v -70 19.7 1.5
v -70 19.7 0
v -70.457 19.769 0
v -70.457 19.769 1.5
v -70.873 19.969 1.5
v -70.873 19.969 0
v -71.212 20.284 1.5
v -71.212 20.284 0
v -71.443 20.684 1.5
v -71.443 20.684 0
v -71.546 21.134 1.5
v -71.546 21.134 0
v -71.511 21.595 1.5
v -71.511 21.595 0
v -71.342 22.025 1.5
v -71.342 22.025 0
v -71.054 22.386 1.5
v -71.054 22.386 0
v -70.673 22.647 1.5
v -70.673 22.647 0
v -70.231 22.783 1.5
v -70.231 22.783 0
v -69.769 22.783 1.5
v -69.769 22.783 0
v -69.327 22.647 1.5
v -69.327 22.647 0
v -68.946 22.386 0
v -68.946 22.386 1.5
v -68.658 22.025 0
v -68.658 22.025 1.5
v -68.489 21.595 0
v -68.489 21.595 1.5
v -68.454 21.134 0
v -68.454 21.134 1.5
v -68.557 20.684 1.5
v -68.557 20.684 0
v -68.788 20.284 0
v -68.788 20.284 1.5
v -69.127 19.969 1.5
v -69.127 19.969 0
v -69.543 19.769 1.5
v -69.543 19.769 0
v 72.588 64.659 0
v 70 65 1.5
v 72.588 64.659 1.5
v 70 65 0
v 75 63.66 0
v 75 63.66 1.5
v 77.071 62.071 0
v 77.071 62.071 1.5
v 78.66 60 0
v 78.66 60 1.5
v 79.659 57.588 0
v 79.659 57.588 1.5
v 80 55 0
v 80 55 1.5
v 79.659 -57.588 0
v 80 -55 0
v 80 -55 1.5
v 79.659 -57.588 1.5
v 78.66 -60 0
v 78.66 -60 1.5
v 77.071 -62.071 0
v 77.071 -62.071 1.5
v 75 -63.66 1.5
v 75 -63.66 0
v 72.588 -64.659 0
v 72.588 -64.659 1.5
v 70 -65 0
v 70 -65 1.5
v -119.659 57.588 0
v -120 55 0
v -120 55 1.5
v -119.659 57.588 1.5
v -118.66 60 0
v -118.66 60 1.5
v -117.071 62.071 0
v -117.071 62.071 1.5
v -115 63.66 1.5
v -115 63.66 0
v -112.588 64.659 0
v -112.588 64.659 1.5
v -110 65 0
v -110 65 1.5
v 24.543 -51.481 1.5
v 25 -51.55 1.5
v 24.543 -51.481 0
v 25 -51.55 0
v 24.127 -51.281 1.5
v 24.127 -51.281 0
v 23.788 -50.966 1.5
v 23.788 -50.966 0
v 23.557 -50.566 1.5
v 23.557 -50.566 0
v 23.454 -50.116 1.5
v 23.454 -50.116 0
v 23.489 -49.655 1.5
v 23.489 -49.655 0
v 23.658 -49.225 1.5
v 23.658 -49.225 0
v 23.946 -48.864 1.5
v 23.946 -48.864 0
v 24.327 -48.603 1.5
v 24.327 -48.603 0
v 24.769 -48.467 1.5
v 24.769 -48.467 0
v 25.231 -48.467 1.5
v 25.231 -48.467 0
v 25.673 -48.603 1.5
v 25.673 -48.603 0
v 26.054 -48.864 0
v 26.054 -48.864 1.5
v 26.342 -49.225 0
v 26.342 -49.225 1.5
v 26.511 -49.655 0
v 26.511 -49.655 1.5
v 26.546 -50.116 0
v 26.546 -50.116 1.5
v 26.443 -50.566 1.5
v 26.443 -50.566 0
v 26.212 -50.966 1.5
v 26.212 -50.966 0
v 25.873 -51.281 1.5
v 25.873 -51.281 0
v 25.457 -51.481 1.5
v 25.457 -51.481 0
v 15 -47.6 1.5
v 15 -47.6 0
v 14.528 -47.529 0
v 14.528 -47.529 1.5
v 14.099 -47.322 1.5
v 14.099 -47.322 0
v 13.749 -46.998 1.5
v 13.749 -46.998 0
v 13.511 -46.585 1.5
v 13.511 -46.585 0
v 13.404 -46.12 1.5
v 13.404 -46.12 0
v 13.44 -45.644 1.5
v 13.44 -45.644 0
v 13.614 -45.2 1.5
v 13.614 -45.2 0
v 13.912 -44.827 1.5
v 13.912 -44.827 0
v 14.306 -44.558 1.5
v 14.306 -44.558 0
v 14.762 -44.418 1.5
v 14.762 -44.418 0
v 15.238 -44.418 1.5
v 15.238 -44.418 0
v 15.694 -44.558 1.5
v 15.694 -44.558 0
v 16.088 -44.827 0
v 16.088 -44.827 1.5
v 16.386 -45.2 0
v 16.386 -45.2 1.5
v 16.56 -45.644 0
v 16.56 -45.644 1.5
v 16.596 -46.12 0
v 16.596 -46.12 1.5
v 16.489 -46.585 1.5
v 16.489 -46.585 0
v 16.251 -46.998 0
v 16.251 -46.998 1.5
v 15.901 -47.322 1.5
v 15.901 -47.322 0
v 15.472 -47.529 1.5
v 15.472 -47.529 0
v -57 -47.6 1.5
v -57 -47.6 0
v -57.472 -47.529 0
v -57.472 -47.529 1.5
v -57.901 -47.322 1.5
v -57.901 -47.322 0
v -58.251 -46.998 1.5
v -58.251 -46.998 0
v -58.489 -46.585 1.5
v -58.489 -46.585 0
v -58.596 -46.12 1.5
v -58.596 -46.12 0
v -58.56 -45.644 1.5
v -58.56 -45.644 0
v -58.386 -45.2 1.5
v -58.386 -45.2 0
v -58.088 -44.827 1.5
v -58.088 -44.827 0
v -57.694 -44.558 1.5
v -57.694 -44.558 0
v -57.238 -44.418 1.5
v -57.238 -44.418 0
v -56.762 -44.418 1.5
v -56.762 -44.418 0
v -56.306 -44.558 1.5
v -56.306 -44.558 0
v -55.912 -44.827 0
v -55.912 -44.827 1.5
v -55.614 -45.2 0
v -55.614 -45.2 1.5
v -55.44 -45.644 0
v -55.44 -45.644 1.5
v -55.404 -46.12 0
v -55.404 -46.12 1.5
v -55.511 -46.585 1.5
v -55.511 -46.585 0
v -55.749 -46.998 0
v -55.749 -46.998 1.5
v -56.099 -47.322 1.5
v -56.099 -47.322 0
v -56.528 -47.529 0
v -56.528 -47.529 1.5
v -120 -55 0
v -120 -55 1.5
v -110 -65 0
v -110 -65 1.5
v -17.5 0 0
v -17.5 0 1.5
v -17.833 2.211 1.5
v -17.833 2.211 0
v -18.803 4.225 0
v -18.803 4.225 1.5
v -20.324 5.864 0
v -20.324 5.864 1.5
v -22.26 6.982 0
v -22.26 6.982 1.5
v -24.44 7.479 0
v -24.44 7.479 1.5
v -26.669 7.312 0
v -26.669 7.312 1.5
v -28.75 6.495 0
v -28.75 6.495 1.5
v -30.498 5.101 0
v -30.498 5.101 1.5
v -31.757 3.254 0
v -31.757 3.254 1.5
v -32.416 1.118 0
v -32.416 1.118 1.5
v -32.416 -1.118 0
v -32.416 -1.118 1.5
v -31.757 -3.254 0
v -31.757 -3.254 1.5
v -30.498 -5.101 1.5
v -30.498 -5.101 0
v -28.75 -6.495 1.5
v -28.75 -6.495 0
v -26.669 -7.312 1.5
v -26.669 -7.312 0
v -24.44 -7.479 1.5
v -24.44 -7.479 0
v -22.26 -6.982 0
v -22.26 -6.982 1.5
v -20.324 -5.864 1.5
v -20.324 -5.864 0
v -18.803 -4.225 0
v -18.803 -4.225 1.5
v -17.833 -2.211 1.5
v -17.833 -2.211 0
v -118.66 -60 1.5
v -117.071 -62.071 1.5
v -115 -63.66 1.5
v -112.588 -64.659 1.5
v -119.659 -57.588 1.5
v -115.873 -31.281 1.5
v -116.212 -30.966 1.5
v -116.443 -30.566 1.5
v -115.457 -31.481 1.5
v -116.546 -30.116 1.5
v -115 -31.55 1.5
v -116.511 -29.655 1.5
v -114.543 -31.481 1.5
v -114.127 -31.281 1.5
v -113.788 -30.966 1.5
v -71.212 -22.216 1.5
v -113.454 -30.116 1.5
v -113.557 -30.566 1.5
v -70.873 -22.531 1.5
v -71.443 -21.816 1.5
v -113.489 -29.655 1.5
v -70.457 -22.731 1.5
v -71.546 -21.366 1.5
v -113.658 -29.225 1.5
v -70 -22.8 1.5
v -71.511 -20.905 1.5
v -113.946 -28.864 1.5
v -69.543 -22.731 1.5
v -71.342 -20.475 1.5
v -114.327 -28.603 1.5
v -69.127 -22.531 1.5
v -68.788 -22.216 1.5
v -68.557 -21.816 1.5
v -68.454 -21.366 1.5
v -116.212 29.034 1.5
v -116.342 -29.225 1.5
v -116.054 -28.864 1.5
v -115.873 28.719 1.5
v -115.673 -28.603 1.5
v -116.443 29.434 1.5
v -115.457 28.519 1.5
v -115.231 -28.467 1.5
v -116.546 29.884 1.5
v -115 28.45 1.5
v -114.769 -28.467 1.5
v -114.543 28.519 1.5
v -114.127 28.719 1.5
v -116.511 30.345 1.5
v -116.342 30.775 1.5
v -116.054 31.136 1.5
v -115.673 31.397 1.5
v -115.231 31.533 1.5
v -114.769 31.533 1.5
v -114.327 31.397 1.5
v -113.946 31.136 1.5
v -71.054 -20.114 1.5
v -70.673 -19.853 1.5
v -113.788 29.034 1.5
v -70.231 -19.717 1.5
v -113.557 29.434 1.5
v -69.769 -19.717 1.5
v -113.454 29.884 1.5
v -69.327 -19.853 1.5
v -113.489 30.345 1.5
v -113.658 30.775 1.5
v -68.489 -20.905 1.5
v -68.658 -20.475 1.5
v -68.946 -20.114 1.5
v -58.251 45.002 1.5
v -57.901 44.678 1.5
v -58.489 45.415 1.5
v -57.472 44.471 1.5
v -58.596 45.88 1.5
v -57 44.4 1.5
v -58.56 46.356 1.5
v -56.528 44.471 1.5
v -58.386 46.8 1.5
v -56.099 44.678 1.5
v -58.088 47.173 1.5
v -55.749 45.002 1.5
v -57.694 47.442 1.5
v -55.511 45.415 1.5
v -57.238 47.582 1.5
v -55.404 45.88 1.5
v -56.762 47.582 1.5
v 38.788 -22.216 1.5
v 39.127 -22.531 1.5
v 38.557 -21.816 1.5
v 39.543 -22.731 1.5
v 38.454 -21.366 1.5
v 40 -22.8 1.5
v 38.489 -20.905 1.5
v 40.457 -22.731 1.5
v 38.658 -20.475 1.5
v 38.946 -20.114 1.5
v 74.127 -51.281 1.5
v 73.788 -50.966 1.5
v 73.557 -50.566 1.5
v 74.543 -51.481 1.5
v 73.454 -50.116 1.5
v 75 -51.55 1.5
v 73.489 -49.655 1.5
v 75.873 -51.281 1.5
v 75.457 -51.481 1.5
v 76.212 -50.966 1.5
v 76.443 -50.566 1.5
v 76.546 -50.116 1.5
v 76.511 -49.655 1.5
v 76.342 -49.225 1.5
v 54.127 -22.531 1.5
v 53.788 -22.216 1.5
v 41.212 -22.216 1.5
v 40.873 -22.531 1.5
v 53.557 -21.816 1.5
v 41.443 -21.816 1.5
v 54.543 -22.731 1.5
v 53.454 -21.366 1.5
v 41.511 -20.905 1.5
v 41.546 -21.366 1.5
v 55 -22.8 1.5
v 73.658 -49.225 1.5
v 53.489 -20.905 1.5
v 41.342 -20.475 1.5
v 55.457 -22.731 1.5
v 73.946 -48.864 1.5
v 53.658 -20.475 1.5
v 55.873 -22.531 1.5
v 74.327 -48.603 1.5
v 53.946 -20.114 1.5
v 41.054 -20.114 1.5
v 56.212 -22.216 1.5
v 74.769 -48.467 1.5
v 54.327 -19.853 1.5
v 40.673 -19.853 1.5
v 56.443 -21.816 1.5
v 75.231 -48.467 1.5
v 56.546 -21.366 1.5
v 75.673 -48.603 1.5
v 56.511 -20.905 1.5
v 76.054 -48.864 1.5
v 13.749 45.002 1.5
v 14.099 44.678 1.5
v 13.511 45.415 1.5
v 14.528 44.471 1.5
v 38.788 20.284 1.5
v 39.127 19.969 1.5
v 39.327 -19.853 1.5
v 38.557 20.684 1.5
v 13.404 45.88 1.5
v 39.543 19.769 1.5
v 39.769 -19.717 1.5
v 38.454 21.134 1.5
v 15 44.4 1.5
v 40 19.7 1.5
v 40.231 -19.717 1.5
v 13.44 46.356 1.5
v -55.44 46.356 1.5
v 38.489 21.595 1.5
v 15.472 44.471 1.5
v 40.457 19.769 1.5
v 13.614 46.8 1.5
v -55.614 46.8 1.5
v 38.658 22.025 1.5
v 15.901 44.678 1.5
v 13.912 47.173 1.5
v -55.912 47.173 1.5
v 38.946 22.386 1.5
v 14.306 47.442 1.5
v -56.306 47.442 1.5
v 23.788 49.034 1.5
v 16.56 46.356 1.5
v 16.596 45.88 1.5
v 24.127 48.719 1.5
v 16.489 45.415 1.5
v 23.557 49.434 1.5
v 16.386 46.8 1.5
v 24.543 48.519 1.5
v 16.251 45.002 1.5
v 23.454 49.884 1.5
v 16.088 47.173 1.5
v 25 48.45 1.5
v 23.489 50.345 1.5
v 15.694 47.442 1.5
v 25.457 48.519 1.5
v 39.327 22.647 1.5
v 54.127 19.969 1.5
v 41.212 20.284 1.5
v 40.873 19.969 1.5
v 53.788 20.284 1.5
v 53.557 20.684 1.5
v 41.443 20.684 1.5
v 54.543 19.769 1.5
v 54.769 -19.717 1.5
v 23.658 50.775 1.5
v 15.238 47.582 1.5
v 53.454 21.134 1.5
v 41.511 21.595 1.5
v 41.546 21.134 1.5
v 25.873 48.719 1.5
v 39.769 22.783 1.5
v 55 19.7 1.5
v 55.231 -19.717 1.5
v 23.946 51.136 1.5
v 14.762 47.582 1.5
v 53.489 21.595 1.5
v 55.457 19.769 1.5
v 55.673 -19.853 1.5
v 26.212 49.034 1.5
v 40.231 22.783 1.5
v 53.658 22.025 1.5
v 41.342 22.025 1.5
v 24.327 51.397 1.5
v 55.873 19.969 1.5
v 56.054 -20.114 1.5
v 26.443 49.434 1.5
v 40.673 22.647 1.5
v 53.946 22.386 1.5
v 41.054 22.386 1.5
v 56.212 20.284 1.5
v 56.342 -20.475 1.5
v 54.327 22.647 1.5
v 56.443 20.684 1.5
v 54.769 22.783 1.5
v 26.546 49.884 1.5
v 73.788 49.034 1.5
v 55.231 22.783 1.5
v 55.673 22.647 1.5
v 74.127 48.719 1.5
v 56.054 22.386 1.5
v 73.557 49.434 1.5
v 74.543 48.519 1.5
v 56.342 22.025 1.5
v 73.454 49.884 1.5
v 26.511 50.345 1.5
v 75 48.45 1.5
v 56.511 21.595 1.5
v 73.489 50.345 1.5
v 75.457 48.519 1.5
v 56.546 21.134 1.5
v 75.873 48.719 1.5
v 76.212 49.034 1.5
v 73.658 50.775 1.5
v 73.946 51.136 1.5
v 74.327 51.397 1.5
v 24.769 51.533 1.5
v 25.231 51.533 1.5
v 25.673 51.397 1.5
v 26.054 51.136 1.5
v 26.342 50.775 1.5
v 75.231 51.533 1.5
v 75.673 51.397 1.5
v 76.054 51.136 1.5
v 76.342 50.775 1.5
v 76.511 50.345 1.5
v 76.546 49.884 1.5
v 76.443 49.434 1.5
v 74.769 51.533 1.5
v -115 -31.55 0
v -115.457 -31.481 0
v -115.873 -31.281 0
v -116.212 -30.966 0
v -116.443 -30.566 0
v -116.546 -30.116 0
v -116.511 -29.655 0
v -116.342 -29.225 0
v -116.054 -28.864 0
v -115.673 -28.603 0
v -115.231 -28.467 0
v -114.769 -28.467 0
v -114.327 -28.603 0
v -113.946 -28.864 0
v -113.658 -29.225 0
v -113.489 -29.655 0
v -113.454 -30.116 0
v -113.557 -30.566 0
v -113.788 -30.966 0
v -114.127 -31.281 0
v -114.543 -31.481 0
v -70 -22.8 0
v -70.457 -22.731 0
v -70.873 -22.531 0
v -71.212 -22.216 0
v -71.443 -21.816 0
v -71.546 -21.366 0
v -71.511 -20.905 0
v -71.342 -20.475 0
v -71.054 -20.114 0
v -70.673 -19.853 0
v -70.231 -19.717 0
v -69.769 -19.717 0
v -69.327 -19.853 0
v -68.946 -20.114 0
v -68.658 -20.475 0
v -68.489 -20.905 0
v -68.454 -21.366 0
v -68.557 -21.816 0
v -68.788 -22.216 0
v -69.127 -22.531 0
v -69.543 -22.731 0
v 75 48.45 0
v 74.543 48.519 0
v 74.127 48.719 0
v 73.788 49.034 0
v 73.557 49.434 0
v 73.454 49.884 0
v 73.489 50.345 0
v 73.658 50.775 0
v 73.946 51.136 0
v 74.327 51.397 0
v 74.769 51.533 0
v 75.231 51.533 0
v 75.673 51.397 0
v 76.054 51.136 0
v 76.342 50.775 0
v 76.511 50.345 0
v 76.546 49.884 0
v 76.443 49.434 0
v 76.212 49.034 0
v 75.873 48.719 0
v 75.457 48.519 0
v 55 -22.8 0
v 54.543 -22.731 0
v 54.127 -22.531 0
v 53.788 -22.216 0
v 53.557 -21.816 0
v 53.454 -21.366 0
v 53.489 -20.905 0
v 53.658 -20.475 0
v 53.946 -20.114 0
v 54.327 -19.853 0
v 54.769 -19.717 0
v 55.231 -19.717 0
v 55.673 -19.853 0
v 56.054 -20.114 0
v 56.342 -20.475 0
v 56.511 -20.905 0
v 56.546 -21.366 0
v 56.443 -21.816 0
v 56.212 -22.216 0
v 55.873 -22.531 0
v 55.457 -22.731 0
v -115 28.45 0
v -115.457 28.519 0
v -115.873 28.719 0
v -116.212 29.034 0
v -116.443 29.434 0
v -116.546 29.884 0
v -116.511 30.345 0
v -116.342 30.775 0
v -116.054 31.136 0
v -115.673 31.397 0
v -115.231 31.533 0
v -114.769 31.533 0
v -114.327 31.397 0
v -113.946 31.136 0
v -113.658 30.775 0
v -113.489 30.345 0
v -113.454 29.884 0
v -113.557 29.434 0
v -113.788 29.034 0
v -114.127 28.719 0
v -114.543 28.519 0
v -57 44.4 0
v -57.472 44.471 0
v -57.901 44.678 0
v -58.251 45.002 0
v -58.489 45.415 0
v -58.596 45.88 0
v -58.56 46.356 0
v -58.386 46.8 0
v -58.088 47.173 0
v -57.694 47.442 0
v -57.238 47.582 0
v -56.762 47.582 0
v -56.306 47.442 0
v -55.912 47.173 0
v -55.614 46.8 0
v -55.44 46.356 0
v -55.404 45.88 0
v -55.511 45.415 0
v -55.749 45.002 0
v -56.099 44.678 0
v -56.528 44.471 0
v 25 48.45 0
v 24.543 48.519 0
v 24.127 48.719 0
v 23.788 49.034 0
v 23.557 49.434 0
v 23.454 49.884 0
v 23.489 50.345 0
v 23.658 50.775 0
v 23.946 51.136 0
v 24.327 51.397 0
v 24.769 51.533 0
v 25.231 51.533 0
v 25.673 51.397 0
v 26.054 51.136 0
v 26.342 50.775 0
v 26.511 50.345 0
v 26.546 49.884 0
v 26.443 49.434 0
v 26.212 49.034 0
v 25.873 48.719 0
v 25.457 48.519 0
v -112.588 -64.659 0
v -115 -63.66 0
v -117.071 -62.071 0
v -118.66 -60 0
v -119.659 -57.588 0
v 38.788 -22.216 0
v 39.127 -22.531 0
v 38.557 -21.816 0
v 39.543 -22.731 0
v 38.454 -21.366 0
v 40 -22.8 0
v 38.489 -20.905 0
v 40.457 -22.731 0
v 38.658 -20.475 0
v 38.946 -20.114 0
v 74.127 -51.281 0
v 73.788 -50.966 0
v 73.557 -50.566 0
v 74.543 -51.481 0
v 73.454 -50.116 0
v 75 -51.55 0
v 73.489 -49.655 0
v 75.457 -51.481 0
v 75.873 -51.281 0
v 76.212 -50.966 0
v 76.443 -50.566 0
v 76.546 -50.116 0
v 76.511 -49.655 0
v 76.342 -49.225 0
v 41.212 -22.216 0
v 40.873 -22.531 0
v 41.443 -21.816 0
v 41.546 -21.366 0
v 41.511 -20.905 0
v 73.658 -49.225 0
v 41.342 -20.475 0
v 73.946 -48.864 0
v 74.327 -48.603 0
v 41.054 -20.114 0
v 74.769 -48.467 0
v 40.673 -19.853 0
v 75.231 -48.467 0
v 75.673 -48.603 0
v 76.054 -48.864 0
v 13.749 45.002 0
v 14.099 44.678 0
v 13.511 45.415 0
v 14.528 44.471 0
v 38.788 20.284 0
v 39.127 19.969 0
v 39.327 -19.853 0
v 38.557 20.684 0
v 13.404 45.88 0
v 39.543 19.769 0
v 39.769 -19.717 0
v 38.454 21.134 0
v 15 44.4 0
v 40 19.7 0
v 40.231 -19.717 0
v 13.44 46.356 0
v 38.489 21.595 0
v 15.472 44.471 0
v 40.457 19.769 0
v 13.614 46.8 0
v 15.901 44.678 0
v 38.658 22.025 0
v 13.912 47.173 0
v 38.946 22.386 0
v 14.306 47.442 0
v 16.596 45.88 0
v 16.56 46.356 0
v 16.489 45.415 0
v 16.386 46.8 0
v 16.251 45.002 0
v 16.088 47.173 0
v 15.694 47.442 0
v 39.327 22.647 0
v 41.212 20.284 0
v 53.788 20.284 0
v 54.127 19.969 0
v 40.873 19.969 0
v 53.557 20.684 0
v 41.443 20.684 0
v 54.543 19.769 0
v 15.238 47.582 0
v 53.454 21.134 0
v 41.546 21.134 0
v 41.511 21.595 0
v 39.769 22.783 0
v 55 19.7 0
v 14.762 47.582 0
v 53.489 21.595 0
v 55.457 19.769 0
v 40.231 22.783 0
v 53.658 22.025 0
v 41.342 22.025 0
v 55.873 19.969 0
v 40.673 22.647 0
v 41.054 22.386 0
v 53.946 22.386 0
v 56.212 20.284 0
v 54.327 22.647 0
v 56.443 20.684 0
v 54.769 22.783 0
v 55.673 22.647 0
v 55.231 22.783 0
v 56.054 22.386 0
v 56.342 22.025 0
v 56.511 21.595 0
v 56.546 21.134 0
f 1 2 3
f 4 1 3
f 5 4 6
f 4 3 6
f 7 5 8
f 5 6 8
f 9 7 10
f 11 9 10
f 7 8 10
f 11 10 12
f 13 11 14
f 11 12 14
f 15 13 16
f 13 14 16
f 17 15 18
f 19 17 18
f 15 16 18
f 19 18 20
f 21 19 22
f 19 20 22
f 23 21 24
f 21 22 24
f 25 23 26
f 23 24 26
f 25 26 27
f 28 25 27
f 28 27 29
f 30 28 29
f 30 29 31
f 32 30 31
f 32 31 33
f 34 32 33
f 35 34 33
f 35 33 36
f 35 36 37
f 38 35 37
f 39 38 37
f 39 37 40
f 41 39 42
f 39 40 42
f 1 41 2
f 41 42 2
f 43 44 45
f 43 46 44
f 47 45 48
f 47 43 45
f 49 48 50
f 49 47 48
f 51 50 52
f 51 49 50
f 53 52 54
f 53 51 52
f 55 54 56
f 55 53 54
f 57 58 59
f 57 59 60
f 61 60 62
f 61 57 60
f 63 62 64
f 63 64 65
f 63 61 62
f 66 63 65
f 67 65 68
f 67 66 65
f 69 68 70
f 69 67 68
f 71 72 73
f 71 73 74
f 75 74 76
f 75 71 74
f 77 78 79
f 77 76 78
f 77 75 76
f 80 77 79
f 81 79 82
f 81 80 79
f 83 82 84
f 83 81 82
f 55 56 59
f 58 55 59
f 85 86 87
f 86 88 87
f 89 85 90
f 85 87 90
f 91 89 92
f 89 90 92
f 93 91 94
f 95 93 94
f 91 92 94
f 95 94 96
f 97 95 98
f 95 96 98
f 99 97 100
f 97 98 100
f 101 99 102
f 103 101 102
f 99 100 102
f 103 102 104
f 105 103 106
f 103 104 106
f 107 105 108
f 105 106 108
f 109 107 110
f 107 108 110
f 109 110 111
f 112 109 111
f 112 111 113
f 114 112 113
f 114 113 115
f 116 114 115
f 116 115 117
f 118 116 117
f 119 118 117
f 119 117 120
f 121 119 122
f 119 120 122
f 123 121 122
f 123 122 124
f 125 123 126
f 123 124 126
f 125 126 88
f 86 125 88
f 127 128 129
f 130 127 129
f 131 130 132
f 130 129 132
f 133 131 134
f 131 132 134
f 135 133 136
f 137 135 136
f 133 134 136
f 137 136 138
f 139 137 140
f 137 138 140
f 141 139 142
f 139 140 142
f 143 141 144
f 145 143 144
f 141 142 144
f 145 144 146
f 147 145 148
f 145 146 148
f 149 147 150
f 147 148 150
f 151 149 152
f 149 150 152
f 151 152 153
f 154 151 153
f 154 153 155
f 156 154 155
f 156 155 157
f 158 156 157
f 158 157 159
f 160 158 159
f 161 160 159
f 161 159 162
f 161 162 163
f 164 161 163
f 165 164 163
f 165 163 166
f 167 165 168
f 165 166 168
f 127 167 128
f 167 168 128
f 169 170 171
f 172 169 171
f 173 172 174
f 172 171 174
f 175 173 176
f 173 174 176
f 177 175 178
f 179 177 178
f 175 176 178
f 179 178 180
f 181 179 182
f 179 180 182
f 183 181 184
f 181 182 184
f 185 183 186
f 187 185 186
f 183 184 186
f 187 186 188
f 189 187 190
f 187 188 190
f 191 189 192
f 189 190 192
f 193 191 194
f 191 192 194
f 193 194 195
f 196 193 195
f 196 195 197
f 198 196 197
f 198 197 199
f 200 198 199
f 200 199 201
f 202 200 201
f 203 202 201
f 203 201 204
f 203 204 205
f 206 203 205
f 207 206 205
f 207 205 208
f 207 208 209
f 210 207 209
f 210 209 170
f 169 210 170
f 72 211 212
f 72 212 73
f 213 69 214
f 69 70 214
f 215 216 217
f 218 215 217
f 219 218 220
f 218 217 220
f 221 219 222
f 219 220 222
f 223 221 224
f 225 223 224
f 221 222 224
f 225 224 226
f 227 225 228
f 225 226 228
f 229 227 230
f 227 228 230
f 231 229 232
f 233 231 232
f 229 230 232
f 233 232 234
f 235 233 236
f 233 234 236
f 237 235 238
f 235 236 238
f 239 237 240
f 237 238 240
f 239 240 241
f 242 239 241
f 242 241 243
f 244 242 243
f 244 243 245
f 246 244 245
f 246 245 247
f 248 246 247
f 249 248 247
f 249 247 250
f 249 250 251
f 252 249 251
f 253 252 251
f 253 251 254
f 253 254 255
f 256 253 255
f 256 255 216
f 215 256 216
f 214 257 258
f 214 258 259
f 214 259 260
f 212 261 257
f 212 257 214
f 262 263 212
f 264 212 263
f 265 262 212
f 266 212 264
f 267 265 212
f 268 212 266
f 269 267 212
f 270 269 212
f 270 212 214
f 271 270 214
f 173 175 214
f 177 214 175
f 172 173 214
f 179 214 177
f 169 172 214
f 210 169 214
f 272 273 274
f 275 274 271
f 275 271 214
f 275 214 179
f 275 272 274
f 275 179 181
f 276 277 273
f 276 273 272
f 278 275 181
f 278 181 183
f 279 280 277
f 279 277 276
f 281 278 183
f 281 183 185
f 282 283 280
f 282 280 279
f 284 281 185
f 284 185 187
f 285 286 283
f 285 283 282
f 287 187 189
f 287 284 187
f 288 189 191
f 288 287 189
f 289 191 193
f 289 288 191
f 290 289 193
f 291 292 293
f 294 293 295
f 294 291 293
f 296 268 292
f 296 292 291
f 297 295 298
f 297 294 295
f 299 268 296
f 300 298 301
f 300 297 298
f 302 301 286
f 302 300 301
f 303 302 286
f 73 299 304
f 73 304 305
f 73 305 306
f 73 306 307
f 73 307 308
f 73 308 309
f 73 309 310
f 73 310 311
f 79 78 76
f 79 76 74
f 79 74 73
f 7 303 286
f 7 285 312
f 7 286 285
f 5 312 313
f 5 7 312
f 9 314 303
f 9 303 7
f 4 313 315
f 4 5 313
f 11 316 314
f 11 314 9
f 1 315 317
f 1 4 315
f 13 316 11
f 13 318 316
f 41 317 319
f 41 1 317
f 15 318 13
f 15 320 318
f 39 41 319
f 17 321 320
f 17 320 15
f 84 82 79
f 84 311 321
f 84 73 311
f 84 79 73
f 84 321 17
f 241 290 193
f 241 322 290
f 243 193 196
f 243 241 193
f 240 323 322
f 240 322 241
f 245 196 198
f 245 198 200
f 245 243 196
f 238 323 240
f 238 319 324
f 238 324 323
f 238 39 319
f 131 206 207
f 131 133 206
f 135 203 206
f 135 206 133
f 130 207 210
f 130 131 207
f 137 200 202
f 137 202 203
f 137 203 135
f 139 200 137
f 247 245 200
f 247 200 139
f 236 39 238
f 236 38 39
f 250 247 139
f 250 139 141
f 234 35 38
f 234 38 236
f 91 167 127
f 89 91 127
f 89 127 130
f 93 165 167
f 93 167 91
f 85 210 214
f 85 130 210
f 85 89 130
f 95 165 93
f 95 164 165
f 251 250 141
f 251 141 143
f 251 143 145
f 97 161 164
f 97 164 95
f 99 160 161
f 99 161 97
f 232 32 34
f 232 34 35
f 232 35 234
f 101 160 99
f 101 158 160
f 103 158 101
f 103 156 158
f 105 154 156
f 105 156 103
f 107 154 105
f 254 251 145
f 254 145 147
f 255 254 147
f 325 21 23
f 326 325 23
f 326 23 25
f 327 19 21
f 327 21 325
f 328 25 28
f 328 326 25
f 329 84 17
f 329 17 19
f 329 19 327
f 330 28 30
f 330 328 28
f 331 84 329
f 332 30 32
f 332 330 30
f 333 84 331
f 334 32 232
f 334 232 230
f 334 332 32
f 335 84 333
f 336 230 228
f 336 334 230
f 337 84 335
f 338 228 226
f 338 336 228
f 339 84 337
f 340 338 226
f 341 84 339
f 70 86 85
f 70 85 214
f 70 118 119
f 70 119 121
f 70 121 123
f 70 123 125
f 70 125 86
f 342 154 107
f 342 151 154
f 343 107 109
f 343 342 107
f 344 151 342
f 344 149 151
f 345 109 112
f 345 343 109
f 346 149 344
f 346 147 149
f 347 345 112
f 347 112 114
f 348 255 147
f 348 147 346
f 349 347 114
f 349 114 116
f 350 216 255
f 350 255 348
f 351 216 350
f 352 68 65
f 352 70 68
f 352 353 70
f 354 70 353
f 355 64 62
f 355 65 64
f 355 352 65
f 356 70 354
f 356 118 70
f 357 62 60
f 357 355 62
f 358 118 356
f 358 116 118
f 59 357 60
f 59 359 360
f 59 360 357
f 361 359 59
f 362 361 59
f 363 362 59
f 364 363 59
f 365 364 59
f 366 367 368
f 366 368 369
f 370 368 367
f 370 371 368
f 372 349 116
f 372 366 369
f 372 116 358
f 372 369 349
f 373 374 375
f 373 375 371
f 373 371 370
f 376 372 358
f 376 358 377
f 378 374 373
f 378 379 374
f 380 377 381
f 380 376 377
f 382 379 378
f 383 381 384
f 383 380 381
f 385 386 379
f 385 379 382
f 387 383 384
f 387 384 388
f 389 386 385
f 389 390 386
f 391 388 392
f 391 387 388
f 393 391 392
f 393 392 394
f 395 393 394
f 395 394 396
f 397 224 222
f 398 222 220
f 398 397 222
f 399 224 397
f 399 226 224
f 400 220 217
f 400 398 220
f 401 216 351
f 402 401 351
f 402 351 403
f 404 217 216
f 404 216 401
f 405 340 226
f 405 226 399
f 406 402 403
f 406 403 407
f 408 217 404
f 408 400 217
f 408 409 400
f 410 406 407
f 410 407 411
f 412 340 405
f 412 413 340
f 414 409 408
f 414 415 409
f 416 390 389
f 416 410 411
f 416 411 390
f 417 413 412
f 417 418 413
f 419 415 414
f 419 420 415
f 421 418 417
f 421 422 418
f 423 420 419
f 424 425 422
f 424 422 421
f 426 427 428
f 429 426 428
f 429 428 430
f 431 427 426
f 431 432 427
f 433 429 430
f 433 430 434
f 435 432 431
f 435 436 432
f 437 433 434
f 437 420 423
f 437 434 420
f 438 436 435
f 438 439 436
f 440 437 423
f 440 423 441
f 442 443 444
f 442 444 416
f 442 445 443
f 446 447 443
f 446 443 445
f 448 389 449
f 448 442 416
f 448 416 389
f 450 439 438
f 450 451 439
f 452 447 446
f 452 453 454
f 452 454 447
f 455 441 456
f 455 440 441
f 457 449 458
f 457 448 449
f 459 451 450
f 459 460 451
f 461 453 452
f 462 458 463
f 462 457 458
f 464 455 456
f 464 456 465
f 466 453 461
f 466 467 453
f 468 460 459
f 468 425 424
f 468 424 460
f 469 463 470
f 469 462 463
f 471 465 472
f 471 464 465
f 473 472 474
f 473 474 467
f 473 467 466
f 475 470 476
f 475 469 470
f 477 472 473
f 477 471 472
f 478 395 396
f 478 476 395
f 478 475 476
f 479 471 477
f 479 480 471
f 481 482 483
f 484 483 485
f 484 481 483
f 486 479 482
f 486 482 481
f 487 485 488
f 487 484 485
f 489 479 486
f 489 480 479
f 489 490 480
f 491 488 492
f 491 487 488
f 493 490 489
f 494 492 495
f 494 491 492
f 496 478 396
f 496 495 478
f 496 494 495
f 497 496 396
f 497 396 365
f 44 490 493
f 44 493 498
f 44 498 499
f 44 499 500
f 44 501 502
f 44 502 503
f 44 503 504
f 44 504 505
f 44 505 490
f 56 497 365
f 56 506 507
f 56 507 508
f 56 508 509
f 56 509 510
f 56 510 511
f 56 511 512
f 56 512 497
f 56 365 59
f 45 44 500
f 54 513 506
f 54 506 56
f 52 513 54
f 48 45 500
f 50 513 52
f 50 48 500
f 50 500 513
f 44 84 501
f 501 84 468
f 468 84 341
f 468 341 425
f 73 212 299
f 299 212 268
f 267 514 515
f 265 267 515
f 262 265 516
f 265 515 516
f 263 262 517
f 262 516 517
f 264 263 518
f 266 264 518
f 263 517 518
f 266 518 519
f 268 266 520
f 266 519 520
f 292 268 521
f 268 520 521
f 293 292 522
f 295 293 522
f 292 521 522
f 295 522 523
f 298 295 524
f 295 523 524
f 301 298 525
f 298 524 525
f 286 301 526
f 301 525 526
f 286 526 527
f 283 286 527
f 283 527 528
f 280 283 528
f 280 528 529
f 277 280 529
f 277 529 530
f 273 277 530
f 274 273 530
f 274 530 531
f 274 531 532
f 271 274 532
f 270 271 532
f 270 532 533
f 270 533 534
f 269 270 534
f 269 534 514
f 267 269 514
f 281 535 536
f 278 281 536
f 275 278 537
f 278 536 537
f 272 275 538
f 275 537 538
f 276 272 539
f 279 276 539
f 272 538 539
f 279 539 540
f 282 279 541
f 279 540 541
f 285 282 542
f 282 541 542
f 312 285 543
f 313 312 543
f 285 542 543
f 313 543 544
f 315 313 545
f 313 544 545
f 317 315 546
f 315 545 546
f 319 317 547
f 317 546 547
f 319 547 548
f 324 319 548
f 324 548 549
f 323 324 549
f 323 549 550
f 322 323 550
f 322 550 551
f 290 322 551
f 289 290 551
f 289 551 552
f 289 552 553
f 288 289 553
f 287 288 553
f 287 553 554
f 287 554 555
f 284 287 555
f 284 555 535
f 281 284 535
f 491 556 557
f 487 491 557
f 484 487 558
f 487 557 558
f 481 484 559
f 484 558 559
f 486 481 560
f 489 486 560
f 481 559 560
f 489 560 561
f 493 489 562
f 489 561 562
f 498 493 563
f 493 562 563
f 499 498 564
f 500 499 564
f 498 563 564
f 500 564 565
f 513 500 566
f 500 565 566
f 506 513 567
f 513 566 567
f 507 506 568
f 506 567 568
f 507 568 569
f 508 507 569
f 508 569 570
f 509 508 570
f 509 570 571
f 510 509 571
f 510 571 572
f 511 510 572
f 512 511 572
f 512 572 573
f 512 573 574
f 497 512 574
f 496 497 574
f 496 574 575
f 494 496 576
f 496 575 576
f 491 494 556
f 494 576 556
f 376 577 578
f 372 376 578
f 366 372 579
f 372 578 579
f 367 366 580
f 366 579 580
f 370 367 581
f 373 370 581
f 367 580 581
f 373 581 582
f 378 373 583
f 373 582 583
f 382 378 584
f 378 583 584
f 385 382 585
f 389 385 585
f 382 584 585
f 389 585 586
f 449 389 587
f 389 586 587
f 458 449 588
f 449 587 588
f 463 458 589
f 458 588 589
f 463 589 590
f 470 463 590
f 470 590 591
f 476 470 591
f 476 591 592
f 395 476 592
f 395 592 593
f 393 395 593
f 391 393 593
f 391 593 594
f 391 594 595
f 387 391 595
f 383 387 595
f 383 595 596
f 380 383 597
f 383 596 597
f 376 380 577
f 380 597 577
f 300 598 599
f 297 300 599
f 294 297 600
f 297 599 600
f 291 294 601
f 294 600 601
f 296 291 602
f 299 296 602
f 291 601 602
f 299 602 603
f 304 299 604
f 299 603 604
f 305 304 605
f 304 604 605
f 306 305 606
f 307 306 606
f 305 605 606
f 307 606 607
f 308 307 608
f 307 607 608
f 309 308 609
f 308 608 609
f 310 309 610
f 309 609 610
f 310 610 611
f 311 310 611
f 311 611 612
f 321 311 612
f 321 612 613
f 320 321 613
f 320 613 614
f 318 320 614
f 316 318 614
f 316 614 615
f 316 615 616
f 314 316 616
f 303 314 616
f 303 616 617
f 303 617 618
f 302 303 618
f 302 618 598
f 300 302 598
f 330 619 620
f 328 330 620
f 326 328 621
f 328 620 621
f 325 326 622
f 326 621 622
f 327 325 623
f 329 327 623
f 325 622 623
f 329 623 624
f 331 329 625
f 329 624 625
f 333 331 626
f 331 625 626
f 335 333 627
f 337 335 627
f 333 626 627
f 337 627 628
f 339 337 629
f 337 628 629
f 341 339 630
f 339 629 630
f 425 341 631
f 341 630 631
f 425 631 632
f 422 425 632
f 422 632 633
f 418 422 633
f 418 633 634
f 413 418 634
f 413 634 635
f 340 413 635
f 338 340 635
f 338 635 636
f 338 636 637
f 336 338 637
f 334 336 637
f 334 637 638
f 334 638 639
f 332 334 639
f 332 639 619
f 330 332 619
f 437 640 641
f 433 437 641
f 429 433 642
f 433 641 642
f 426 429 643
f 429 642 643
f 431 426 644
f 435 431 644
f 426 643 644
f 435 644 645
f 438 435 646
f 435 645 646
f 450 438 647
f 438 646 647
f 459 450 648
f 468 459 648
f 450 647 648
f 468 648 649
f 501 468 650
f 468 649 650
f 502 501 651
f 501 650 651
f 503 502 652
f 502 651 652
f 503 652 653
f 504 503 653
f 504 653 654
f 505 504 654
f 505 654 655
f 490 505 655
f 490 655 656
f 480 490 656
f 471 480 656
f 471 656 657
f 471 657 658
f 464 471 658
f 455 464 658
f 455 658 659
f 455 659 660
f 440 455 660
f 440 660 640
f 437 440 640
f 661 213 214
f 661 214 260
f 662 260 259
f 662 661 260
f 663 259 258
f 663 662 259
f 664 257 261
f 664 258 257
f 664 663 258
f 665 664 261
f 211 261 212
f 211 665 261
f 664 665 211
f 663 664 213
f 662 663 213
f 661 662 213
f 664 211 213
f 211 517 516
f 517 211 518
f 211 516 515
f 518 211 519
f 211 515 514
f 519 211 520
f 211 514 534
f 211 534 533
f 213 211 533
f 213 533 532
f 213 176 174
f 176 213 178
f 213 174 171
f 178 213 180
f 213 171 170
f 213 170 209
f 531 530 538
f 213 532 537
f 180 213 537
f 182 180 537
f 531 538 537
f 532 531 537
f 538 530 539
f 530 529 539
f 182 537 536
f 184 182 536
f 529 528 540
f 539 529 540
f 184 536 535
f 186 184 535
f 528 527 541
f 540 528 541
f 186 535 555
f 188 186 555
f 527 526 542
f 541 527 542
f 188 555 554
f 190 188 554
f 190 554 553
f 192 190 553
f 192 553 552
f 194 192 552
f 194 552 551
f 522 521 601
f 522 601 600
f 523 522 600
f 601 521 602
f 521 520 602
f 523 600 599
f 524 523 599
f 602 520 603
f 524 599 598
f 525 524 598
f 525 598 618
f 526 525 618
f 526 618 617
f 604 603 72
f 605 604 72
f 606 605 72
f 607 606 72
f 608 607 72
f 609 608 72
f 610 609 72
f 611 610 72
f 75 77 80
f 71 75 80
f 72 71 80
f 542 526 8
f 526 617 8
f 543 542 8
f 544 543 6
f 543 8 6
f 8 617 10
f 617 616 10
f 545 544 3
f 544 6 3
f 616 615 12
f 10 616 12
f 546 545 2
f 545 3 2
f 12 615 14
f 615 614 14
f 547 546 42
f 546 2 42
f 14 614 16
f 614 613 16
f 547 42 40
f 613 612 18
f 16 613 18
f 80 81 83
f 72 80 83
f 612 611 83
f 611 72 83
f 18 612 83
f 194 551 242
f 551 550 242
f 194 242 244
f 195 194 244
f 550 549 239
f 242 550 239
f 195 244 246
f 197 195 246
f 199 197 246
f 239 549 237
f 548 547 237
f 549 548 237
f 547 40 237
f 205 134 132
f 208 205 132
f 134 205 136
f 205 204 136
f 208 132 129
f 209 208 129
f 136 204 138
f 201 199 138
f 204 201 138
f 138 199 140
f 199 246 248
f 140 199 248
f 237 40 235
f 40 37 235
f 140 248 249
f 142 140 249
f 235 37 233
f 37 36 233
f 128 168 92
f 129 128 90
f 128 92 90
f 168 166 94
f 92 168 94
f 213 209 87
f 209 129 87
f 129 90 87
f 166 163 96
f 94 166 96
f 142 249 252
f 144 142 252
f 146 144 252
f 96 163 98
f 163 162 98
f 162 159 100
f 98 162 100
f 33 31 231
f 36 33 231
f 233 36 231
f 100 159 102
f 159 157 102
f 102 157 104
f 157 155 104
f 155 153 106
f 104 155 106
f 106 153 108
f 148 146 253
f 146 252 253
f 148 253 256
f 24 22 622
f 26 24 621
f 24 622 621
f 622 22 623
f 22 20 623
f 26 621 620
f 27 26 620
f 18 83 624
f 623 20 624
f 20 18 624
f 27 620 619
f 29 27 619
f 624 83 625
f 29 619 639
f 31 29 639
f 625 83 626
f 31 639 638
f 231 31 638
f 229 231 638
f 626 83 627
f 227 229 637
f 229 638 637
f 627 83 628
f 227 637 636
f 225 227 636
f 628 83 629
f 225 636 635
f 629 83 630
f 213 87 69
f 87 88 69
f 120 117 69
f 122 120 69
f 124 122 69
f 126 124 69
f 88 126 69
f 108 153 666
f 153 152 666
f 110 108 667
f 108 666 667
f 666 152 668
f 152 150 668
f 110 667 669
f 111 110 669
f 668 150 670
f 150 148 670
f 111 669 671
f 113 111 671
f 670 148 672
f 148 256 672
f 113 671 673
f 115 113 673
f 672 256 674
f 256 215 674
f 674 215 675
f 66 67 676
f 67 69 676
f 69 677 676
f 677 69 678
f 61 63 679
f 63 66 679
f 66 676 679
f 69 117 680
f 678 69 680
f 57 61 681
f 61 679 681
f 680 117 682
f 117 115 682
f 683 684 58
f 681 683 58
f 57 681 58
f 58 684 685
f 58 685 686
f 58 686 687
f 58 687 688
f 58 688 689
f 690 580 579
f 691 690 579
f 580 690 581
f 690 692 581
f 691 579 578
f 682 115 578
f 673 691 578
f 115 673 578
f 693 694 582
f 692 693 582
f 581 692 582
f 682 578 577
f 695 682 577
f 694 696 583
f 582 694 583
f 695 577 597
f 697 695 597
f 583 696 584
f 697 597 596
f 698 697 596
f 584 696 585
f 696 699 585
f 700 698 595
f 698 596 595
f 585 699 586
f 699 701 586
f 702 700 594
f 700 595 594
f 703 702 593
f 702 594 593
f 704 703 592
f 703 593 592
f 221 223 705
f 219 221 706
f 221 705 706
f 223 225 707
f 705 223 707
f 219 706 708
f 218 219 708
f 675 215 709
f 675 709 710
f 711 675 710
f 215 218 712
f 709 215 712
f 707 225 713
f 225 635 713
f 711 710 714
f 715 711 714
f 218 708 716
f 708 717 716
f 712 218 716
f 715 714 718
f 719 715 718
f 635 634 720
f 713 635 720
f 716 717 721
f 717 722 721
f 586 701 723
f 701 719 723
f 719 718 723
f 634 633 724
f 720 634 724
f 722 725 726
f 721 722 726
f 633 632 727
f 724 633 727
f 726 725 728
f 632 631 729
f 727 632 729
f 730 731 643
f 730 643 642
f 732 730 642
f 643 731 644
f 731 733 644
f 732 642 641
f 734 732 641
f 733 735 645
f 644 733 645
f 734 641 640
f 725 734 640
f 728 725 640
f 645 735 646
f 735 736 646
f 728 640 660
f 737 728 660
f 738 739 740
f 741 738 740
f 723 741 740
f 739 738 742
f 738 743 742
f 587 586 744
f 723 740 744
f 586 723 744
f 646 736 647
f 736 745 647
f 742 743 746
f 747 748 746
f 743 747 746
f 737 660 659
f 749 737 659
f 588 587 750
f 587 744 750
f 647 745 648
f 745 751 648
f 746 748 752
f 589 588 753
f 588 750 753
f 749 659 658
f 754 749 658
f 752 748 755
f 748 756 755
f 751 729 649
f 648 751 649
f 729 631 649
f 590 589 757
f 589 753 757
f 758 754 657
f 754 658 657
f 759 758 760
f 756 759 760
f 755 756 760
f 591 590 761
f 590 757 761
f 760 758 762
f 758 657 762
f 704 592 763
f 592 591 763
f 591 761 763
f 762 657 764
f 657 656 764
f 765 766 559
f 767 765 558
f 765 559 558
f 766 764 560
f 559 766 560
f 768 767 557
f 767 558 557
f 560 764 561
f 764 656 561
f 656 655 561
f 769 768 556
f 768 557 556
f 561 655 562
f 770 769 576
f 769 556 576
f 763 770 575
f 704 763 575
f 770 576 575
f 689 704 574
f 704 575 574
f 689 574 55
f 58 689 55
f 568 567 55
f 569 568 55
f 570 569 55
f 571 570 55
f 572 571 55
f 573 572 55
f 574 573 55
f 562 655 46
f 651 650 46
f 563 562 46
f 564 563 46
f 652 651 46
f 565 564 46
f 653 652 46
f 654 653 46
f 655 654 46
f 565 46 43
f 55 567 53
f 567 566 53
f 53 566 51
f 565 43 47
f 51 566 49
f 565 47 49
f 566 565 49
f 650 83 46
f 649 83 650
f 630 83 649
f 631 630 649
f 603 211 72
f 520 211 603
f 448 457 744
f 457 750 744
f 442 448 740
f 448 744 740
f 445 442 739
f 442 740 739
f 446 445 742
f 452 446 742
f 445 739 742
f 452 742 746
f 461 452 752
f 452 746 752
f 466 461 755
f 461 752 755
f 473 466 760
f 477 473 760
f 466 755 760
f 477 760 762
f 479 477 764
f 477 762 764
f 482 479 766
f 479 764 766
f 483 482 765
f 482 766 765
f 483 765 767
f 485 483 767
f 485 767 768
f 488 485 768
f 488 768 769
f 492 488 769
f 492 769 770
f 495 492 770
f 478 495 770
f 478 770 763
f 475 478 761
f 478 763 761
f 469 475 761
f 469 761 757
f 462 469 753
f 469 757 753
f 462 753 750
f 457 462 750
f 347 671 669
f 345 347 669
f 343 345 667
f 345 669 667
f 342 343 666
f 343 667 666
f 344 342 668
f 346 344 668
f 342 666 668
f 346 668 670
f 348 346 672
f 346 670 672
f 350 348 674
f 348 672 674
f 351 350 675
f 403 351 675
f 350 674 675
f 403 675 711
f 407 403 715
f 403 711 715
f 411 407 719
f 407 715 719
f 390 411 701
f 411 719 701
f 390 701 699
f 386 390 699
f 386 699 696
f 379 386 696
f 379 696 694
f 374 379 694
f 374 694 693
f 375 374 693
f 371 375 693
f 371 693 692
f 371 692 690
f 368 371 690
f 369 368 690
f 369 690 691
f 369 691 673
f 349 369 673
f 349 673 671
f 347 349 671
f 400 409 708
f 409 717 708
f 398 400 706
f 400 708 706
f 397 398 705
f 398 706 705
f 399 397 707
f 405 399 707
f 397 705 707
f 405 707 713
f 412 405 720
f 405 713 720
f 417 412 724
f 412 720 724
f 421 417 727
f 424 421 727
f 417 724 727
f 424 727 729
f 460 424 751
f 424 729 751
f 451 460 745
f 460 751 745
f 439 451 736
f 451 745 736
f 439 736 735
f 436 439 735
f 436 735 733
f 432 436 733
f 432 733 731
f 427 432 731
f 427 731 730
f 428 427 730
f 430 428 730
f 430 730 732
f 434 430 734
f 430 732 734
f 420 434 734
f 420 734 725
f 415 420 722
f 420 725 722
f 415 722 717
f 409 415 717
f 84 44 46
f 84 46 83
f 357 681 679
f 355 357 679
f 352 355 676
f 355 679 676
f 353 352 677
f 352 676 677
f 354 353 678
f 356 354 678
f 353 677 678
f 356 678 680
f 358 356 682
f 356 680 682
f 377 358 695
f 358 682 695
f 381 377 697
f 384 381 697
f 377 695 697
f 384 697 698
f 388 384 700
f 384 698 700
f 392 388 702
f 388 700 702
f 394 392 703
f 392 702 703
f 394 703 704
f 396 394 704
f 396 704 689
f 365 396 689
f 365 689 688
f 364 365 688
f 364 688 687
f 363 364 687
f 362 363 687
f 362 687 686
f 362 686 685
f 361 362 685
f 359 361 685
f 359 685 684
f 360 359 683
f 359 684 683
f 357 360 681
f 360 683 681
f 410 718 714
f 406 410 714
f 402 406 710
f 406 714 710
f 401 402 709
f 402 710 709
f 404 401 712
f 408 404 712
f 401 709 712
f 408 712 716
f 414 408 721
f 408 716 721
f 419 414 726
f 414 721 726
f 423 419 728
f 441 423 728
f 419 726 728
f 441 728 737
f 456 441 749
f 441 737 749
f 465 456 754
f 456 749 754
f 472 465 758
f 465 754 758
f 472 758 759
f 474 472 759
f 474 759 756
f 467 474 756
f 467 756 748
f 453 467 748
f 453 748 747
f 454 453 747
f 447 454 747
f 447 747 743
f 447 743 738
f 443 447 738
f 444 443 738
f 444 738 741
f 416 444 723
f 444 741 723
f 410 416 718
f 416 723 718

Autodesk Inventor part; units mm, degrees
ref_plane "YZ Plane" through (0, 0, 0) normal (1, 0, 0) x (0, 1, 0)
ref_plane "XZ Plane" through (0, 0, 0) normal (0, 1, 0) x (-1, 0, 0)
ref_plane "XY Plane" through (0, 0, 0) normal (0, 0, 1) x (1, 0, 0)
sketch "スケッチ1" plane through (0, 0, 0) normal (0, 0, 1) x (1, 0, 0)
  line L0 (-120, 75) -> (120, 75)
  line L1 (120, 75) -> (120, -75)
  line L2 (120, -75) -> (-120, -75)
  line L3 (-120, -75) -> (-120, 75)
  line L4 (-120, 75) -> (120, -75) construction
  line L5 (120, 75) -> (-120, -75) construction
  point P0 (0, 0)
  dimension "d0" = 240
  dimension "d1" = 150
extrude "押し出し1" add sketch "スケッチ1" along normal blind 1.5
sketch "スケッチ2" plane through (0, 0, 1.5) normal (0, 0, 1) x (1, 0, 0)
  line L0 (-120, 75) -> (-120, -75) projected
  line L1 (120, 75) -> (-120, 75) projected
  line L2 (-120, -75) -> (120, -75) projected
  point P0 (0, 0)
  point P1 (-70, 21.25)
  point P2 (-70, -21.25)
  point P3 (40, 21.25)
  point P4 (40, -21.25)
  point P5 (55, 21.25)
  point P6 (55, -21.25)
  point P7 (-115, 30)
  point P8 (-115, -30)
  dimension "d4" = 50
  dimension "d5" = 53.75
  dimension "d6" = 50
  dimension "d7" = 53.75
  dimension "d8" = 160
  dimension "d9" = 53.75
  dimension "d10" = 53.75
  dimension "d11" = 15
  dimension "d12" = 15
  dimension "d13" = 53.75
  dimension "d14" = 53.75
  dimension "d22" = 60
  dimension "d23" = 30
  dimension "d24" = 5
  dimension "d42" = 42.5
hole "穴1" at (-70, 21.25, 1.5) at (-70, -21.25, 1.5) at (40, 21.25, 1.5) at (40, -21.25, 1.5) at (55, 21.25, 1.5) at (55, -21.25, 1.5) at (-115, 30, 1.5) at (-115, -30, 1.5) direction (0, 0, -1) diameter 3.1 end through all
sketch "スケッチ4" plane through (0, 0, 1.5) normal (0, 0, 1) x (1, 0, 0)
  line L0 (-120, 75) -> (-120, -75) projected
  point P0 (0, 0)
  point P1 (25, 50)
  point P2 (25, -50)
  point P3 (75, 50)
  point P4 (75, -50)
  dimension "d25" = 195
  dimension "d26" = 195
  dimension "d27" = 145
  dimension "d28" = 145
  dimension "d29" = 100
  dimension "d30" = 100
  dimension "d33" = 50
  dimension "d34" = 50
hole "穴2" at (25, 50, 1.5) at (25, -50, 1.5) at (75, 50, 1.5) at (75, -50, 1.5) direction (0, 0, -1) diameter 3.1 depth 3.2 tip angle 118
sketch "スケッチ5" plane through (0, 0, 1.5) normal (0, 0, 1) x (1, 0, 0)
  line L0 (-120, -75) -> (120, -75) projected
  line L1 (120, 75) -> (80, 75)
  line L2 (80, 75) -> (80, -75)
  line L3 (80, -75) -> (120, -75)
  line L4 (120, -75) -> (120, 75)
  point P0 (0, 0)
  dimension "d43" = 40
extrude "押し出し2" cut sketch "スケッチ5" against normal blind 10
sketch "スケッチ6" plane through (0, 0, 1.5) normal (0, 0, 1) x (1, 0, 0)
  line L0 (-120, -75) -> (80, -75)
  line L1 (80, -75) -> (80, -65)
  line L2 (80, -65) -> (-120, -65)
  line L3 (-120, -65) -> (-120, -75)
  line L4 (-120, 75) -> (80, 75)
  line L5 (80, 75) -> (80, 65)
  line L6 (80, 65) -> (-120, 65)
  line L7 (-120, 65) -> (-120, 75)
  point P0 (0, 0)
  dimension "d46" = 200
  dimension "d47" = 10
  dimension "d48" = 200
  dimension "d49" = 10
extrude "押し出し3" cut sketch "スケッチ6" against normal blind 10
sketch "スケッチ7" plane through (0, 0, 1.5) normal (0, 0, 1) x (1, 0, 0)
  circle A0 centre (-25, 0) radius 7.5
  point P0 (0, 0)
  dimension "d52" = 15
  dimension "d55" = 25
extrude "押し出し4" cut sketch "スケッチ7" against normal blind 10
fillet "フィレット1" radius 10 4 edges at (80, -65, 0.75) (80, 65, 0.75) (-120, 65, 0.75) (-120, -65, 0.75)
sketch "スケッチ8" plane through (0, 0, 1.5) normal (0, 0, 1) x (1, 0, 0)
  line L0 (-110, -65) -> (70, -65) projected
  line L1 (70, 65) -> (-110, 65) projected
  circle A0 centre (25, 50) radius 1.55 projected
  line L2 (80, -55) -> (80, 55) projected
  point P0 (0, 0)
  point P1 (-57, -46)
  point P2 (15, -46)
  point P3 (-57, 46)
  point P4 (15, 46)
  dimension "d59" = 19
  dimension "d60" = 19
  dimension "d61" = 72
  dimension "d64" = 65
hole "穴3" at (-57, -46, 1.5) at (15, -46, 1.5) at (-57, 46, 1.5) at (15, 46, 1.5) direction (0, 0, -1) diameter 3.2 end through all
properties part number "Board 2" material "アルミニウム 6061"
